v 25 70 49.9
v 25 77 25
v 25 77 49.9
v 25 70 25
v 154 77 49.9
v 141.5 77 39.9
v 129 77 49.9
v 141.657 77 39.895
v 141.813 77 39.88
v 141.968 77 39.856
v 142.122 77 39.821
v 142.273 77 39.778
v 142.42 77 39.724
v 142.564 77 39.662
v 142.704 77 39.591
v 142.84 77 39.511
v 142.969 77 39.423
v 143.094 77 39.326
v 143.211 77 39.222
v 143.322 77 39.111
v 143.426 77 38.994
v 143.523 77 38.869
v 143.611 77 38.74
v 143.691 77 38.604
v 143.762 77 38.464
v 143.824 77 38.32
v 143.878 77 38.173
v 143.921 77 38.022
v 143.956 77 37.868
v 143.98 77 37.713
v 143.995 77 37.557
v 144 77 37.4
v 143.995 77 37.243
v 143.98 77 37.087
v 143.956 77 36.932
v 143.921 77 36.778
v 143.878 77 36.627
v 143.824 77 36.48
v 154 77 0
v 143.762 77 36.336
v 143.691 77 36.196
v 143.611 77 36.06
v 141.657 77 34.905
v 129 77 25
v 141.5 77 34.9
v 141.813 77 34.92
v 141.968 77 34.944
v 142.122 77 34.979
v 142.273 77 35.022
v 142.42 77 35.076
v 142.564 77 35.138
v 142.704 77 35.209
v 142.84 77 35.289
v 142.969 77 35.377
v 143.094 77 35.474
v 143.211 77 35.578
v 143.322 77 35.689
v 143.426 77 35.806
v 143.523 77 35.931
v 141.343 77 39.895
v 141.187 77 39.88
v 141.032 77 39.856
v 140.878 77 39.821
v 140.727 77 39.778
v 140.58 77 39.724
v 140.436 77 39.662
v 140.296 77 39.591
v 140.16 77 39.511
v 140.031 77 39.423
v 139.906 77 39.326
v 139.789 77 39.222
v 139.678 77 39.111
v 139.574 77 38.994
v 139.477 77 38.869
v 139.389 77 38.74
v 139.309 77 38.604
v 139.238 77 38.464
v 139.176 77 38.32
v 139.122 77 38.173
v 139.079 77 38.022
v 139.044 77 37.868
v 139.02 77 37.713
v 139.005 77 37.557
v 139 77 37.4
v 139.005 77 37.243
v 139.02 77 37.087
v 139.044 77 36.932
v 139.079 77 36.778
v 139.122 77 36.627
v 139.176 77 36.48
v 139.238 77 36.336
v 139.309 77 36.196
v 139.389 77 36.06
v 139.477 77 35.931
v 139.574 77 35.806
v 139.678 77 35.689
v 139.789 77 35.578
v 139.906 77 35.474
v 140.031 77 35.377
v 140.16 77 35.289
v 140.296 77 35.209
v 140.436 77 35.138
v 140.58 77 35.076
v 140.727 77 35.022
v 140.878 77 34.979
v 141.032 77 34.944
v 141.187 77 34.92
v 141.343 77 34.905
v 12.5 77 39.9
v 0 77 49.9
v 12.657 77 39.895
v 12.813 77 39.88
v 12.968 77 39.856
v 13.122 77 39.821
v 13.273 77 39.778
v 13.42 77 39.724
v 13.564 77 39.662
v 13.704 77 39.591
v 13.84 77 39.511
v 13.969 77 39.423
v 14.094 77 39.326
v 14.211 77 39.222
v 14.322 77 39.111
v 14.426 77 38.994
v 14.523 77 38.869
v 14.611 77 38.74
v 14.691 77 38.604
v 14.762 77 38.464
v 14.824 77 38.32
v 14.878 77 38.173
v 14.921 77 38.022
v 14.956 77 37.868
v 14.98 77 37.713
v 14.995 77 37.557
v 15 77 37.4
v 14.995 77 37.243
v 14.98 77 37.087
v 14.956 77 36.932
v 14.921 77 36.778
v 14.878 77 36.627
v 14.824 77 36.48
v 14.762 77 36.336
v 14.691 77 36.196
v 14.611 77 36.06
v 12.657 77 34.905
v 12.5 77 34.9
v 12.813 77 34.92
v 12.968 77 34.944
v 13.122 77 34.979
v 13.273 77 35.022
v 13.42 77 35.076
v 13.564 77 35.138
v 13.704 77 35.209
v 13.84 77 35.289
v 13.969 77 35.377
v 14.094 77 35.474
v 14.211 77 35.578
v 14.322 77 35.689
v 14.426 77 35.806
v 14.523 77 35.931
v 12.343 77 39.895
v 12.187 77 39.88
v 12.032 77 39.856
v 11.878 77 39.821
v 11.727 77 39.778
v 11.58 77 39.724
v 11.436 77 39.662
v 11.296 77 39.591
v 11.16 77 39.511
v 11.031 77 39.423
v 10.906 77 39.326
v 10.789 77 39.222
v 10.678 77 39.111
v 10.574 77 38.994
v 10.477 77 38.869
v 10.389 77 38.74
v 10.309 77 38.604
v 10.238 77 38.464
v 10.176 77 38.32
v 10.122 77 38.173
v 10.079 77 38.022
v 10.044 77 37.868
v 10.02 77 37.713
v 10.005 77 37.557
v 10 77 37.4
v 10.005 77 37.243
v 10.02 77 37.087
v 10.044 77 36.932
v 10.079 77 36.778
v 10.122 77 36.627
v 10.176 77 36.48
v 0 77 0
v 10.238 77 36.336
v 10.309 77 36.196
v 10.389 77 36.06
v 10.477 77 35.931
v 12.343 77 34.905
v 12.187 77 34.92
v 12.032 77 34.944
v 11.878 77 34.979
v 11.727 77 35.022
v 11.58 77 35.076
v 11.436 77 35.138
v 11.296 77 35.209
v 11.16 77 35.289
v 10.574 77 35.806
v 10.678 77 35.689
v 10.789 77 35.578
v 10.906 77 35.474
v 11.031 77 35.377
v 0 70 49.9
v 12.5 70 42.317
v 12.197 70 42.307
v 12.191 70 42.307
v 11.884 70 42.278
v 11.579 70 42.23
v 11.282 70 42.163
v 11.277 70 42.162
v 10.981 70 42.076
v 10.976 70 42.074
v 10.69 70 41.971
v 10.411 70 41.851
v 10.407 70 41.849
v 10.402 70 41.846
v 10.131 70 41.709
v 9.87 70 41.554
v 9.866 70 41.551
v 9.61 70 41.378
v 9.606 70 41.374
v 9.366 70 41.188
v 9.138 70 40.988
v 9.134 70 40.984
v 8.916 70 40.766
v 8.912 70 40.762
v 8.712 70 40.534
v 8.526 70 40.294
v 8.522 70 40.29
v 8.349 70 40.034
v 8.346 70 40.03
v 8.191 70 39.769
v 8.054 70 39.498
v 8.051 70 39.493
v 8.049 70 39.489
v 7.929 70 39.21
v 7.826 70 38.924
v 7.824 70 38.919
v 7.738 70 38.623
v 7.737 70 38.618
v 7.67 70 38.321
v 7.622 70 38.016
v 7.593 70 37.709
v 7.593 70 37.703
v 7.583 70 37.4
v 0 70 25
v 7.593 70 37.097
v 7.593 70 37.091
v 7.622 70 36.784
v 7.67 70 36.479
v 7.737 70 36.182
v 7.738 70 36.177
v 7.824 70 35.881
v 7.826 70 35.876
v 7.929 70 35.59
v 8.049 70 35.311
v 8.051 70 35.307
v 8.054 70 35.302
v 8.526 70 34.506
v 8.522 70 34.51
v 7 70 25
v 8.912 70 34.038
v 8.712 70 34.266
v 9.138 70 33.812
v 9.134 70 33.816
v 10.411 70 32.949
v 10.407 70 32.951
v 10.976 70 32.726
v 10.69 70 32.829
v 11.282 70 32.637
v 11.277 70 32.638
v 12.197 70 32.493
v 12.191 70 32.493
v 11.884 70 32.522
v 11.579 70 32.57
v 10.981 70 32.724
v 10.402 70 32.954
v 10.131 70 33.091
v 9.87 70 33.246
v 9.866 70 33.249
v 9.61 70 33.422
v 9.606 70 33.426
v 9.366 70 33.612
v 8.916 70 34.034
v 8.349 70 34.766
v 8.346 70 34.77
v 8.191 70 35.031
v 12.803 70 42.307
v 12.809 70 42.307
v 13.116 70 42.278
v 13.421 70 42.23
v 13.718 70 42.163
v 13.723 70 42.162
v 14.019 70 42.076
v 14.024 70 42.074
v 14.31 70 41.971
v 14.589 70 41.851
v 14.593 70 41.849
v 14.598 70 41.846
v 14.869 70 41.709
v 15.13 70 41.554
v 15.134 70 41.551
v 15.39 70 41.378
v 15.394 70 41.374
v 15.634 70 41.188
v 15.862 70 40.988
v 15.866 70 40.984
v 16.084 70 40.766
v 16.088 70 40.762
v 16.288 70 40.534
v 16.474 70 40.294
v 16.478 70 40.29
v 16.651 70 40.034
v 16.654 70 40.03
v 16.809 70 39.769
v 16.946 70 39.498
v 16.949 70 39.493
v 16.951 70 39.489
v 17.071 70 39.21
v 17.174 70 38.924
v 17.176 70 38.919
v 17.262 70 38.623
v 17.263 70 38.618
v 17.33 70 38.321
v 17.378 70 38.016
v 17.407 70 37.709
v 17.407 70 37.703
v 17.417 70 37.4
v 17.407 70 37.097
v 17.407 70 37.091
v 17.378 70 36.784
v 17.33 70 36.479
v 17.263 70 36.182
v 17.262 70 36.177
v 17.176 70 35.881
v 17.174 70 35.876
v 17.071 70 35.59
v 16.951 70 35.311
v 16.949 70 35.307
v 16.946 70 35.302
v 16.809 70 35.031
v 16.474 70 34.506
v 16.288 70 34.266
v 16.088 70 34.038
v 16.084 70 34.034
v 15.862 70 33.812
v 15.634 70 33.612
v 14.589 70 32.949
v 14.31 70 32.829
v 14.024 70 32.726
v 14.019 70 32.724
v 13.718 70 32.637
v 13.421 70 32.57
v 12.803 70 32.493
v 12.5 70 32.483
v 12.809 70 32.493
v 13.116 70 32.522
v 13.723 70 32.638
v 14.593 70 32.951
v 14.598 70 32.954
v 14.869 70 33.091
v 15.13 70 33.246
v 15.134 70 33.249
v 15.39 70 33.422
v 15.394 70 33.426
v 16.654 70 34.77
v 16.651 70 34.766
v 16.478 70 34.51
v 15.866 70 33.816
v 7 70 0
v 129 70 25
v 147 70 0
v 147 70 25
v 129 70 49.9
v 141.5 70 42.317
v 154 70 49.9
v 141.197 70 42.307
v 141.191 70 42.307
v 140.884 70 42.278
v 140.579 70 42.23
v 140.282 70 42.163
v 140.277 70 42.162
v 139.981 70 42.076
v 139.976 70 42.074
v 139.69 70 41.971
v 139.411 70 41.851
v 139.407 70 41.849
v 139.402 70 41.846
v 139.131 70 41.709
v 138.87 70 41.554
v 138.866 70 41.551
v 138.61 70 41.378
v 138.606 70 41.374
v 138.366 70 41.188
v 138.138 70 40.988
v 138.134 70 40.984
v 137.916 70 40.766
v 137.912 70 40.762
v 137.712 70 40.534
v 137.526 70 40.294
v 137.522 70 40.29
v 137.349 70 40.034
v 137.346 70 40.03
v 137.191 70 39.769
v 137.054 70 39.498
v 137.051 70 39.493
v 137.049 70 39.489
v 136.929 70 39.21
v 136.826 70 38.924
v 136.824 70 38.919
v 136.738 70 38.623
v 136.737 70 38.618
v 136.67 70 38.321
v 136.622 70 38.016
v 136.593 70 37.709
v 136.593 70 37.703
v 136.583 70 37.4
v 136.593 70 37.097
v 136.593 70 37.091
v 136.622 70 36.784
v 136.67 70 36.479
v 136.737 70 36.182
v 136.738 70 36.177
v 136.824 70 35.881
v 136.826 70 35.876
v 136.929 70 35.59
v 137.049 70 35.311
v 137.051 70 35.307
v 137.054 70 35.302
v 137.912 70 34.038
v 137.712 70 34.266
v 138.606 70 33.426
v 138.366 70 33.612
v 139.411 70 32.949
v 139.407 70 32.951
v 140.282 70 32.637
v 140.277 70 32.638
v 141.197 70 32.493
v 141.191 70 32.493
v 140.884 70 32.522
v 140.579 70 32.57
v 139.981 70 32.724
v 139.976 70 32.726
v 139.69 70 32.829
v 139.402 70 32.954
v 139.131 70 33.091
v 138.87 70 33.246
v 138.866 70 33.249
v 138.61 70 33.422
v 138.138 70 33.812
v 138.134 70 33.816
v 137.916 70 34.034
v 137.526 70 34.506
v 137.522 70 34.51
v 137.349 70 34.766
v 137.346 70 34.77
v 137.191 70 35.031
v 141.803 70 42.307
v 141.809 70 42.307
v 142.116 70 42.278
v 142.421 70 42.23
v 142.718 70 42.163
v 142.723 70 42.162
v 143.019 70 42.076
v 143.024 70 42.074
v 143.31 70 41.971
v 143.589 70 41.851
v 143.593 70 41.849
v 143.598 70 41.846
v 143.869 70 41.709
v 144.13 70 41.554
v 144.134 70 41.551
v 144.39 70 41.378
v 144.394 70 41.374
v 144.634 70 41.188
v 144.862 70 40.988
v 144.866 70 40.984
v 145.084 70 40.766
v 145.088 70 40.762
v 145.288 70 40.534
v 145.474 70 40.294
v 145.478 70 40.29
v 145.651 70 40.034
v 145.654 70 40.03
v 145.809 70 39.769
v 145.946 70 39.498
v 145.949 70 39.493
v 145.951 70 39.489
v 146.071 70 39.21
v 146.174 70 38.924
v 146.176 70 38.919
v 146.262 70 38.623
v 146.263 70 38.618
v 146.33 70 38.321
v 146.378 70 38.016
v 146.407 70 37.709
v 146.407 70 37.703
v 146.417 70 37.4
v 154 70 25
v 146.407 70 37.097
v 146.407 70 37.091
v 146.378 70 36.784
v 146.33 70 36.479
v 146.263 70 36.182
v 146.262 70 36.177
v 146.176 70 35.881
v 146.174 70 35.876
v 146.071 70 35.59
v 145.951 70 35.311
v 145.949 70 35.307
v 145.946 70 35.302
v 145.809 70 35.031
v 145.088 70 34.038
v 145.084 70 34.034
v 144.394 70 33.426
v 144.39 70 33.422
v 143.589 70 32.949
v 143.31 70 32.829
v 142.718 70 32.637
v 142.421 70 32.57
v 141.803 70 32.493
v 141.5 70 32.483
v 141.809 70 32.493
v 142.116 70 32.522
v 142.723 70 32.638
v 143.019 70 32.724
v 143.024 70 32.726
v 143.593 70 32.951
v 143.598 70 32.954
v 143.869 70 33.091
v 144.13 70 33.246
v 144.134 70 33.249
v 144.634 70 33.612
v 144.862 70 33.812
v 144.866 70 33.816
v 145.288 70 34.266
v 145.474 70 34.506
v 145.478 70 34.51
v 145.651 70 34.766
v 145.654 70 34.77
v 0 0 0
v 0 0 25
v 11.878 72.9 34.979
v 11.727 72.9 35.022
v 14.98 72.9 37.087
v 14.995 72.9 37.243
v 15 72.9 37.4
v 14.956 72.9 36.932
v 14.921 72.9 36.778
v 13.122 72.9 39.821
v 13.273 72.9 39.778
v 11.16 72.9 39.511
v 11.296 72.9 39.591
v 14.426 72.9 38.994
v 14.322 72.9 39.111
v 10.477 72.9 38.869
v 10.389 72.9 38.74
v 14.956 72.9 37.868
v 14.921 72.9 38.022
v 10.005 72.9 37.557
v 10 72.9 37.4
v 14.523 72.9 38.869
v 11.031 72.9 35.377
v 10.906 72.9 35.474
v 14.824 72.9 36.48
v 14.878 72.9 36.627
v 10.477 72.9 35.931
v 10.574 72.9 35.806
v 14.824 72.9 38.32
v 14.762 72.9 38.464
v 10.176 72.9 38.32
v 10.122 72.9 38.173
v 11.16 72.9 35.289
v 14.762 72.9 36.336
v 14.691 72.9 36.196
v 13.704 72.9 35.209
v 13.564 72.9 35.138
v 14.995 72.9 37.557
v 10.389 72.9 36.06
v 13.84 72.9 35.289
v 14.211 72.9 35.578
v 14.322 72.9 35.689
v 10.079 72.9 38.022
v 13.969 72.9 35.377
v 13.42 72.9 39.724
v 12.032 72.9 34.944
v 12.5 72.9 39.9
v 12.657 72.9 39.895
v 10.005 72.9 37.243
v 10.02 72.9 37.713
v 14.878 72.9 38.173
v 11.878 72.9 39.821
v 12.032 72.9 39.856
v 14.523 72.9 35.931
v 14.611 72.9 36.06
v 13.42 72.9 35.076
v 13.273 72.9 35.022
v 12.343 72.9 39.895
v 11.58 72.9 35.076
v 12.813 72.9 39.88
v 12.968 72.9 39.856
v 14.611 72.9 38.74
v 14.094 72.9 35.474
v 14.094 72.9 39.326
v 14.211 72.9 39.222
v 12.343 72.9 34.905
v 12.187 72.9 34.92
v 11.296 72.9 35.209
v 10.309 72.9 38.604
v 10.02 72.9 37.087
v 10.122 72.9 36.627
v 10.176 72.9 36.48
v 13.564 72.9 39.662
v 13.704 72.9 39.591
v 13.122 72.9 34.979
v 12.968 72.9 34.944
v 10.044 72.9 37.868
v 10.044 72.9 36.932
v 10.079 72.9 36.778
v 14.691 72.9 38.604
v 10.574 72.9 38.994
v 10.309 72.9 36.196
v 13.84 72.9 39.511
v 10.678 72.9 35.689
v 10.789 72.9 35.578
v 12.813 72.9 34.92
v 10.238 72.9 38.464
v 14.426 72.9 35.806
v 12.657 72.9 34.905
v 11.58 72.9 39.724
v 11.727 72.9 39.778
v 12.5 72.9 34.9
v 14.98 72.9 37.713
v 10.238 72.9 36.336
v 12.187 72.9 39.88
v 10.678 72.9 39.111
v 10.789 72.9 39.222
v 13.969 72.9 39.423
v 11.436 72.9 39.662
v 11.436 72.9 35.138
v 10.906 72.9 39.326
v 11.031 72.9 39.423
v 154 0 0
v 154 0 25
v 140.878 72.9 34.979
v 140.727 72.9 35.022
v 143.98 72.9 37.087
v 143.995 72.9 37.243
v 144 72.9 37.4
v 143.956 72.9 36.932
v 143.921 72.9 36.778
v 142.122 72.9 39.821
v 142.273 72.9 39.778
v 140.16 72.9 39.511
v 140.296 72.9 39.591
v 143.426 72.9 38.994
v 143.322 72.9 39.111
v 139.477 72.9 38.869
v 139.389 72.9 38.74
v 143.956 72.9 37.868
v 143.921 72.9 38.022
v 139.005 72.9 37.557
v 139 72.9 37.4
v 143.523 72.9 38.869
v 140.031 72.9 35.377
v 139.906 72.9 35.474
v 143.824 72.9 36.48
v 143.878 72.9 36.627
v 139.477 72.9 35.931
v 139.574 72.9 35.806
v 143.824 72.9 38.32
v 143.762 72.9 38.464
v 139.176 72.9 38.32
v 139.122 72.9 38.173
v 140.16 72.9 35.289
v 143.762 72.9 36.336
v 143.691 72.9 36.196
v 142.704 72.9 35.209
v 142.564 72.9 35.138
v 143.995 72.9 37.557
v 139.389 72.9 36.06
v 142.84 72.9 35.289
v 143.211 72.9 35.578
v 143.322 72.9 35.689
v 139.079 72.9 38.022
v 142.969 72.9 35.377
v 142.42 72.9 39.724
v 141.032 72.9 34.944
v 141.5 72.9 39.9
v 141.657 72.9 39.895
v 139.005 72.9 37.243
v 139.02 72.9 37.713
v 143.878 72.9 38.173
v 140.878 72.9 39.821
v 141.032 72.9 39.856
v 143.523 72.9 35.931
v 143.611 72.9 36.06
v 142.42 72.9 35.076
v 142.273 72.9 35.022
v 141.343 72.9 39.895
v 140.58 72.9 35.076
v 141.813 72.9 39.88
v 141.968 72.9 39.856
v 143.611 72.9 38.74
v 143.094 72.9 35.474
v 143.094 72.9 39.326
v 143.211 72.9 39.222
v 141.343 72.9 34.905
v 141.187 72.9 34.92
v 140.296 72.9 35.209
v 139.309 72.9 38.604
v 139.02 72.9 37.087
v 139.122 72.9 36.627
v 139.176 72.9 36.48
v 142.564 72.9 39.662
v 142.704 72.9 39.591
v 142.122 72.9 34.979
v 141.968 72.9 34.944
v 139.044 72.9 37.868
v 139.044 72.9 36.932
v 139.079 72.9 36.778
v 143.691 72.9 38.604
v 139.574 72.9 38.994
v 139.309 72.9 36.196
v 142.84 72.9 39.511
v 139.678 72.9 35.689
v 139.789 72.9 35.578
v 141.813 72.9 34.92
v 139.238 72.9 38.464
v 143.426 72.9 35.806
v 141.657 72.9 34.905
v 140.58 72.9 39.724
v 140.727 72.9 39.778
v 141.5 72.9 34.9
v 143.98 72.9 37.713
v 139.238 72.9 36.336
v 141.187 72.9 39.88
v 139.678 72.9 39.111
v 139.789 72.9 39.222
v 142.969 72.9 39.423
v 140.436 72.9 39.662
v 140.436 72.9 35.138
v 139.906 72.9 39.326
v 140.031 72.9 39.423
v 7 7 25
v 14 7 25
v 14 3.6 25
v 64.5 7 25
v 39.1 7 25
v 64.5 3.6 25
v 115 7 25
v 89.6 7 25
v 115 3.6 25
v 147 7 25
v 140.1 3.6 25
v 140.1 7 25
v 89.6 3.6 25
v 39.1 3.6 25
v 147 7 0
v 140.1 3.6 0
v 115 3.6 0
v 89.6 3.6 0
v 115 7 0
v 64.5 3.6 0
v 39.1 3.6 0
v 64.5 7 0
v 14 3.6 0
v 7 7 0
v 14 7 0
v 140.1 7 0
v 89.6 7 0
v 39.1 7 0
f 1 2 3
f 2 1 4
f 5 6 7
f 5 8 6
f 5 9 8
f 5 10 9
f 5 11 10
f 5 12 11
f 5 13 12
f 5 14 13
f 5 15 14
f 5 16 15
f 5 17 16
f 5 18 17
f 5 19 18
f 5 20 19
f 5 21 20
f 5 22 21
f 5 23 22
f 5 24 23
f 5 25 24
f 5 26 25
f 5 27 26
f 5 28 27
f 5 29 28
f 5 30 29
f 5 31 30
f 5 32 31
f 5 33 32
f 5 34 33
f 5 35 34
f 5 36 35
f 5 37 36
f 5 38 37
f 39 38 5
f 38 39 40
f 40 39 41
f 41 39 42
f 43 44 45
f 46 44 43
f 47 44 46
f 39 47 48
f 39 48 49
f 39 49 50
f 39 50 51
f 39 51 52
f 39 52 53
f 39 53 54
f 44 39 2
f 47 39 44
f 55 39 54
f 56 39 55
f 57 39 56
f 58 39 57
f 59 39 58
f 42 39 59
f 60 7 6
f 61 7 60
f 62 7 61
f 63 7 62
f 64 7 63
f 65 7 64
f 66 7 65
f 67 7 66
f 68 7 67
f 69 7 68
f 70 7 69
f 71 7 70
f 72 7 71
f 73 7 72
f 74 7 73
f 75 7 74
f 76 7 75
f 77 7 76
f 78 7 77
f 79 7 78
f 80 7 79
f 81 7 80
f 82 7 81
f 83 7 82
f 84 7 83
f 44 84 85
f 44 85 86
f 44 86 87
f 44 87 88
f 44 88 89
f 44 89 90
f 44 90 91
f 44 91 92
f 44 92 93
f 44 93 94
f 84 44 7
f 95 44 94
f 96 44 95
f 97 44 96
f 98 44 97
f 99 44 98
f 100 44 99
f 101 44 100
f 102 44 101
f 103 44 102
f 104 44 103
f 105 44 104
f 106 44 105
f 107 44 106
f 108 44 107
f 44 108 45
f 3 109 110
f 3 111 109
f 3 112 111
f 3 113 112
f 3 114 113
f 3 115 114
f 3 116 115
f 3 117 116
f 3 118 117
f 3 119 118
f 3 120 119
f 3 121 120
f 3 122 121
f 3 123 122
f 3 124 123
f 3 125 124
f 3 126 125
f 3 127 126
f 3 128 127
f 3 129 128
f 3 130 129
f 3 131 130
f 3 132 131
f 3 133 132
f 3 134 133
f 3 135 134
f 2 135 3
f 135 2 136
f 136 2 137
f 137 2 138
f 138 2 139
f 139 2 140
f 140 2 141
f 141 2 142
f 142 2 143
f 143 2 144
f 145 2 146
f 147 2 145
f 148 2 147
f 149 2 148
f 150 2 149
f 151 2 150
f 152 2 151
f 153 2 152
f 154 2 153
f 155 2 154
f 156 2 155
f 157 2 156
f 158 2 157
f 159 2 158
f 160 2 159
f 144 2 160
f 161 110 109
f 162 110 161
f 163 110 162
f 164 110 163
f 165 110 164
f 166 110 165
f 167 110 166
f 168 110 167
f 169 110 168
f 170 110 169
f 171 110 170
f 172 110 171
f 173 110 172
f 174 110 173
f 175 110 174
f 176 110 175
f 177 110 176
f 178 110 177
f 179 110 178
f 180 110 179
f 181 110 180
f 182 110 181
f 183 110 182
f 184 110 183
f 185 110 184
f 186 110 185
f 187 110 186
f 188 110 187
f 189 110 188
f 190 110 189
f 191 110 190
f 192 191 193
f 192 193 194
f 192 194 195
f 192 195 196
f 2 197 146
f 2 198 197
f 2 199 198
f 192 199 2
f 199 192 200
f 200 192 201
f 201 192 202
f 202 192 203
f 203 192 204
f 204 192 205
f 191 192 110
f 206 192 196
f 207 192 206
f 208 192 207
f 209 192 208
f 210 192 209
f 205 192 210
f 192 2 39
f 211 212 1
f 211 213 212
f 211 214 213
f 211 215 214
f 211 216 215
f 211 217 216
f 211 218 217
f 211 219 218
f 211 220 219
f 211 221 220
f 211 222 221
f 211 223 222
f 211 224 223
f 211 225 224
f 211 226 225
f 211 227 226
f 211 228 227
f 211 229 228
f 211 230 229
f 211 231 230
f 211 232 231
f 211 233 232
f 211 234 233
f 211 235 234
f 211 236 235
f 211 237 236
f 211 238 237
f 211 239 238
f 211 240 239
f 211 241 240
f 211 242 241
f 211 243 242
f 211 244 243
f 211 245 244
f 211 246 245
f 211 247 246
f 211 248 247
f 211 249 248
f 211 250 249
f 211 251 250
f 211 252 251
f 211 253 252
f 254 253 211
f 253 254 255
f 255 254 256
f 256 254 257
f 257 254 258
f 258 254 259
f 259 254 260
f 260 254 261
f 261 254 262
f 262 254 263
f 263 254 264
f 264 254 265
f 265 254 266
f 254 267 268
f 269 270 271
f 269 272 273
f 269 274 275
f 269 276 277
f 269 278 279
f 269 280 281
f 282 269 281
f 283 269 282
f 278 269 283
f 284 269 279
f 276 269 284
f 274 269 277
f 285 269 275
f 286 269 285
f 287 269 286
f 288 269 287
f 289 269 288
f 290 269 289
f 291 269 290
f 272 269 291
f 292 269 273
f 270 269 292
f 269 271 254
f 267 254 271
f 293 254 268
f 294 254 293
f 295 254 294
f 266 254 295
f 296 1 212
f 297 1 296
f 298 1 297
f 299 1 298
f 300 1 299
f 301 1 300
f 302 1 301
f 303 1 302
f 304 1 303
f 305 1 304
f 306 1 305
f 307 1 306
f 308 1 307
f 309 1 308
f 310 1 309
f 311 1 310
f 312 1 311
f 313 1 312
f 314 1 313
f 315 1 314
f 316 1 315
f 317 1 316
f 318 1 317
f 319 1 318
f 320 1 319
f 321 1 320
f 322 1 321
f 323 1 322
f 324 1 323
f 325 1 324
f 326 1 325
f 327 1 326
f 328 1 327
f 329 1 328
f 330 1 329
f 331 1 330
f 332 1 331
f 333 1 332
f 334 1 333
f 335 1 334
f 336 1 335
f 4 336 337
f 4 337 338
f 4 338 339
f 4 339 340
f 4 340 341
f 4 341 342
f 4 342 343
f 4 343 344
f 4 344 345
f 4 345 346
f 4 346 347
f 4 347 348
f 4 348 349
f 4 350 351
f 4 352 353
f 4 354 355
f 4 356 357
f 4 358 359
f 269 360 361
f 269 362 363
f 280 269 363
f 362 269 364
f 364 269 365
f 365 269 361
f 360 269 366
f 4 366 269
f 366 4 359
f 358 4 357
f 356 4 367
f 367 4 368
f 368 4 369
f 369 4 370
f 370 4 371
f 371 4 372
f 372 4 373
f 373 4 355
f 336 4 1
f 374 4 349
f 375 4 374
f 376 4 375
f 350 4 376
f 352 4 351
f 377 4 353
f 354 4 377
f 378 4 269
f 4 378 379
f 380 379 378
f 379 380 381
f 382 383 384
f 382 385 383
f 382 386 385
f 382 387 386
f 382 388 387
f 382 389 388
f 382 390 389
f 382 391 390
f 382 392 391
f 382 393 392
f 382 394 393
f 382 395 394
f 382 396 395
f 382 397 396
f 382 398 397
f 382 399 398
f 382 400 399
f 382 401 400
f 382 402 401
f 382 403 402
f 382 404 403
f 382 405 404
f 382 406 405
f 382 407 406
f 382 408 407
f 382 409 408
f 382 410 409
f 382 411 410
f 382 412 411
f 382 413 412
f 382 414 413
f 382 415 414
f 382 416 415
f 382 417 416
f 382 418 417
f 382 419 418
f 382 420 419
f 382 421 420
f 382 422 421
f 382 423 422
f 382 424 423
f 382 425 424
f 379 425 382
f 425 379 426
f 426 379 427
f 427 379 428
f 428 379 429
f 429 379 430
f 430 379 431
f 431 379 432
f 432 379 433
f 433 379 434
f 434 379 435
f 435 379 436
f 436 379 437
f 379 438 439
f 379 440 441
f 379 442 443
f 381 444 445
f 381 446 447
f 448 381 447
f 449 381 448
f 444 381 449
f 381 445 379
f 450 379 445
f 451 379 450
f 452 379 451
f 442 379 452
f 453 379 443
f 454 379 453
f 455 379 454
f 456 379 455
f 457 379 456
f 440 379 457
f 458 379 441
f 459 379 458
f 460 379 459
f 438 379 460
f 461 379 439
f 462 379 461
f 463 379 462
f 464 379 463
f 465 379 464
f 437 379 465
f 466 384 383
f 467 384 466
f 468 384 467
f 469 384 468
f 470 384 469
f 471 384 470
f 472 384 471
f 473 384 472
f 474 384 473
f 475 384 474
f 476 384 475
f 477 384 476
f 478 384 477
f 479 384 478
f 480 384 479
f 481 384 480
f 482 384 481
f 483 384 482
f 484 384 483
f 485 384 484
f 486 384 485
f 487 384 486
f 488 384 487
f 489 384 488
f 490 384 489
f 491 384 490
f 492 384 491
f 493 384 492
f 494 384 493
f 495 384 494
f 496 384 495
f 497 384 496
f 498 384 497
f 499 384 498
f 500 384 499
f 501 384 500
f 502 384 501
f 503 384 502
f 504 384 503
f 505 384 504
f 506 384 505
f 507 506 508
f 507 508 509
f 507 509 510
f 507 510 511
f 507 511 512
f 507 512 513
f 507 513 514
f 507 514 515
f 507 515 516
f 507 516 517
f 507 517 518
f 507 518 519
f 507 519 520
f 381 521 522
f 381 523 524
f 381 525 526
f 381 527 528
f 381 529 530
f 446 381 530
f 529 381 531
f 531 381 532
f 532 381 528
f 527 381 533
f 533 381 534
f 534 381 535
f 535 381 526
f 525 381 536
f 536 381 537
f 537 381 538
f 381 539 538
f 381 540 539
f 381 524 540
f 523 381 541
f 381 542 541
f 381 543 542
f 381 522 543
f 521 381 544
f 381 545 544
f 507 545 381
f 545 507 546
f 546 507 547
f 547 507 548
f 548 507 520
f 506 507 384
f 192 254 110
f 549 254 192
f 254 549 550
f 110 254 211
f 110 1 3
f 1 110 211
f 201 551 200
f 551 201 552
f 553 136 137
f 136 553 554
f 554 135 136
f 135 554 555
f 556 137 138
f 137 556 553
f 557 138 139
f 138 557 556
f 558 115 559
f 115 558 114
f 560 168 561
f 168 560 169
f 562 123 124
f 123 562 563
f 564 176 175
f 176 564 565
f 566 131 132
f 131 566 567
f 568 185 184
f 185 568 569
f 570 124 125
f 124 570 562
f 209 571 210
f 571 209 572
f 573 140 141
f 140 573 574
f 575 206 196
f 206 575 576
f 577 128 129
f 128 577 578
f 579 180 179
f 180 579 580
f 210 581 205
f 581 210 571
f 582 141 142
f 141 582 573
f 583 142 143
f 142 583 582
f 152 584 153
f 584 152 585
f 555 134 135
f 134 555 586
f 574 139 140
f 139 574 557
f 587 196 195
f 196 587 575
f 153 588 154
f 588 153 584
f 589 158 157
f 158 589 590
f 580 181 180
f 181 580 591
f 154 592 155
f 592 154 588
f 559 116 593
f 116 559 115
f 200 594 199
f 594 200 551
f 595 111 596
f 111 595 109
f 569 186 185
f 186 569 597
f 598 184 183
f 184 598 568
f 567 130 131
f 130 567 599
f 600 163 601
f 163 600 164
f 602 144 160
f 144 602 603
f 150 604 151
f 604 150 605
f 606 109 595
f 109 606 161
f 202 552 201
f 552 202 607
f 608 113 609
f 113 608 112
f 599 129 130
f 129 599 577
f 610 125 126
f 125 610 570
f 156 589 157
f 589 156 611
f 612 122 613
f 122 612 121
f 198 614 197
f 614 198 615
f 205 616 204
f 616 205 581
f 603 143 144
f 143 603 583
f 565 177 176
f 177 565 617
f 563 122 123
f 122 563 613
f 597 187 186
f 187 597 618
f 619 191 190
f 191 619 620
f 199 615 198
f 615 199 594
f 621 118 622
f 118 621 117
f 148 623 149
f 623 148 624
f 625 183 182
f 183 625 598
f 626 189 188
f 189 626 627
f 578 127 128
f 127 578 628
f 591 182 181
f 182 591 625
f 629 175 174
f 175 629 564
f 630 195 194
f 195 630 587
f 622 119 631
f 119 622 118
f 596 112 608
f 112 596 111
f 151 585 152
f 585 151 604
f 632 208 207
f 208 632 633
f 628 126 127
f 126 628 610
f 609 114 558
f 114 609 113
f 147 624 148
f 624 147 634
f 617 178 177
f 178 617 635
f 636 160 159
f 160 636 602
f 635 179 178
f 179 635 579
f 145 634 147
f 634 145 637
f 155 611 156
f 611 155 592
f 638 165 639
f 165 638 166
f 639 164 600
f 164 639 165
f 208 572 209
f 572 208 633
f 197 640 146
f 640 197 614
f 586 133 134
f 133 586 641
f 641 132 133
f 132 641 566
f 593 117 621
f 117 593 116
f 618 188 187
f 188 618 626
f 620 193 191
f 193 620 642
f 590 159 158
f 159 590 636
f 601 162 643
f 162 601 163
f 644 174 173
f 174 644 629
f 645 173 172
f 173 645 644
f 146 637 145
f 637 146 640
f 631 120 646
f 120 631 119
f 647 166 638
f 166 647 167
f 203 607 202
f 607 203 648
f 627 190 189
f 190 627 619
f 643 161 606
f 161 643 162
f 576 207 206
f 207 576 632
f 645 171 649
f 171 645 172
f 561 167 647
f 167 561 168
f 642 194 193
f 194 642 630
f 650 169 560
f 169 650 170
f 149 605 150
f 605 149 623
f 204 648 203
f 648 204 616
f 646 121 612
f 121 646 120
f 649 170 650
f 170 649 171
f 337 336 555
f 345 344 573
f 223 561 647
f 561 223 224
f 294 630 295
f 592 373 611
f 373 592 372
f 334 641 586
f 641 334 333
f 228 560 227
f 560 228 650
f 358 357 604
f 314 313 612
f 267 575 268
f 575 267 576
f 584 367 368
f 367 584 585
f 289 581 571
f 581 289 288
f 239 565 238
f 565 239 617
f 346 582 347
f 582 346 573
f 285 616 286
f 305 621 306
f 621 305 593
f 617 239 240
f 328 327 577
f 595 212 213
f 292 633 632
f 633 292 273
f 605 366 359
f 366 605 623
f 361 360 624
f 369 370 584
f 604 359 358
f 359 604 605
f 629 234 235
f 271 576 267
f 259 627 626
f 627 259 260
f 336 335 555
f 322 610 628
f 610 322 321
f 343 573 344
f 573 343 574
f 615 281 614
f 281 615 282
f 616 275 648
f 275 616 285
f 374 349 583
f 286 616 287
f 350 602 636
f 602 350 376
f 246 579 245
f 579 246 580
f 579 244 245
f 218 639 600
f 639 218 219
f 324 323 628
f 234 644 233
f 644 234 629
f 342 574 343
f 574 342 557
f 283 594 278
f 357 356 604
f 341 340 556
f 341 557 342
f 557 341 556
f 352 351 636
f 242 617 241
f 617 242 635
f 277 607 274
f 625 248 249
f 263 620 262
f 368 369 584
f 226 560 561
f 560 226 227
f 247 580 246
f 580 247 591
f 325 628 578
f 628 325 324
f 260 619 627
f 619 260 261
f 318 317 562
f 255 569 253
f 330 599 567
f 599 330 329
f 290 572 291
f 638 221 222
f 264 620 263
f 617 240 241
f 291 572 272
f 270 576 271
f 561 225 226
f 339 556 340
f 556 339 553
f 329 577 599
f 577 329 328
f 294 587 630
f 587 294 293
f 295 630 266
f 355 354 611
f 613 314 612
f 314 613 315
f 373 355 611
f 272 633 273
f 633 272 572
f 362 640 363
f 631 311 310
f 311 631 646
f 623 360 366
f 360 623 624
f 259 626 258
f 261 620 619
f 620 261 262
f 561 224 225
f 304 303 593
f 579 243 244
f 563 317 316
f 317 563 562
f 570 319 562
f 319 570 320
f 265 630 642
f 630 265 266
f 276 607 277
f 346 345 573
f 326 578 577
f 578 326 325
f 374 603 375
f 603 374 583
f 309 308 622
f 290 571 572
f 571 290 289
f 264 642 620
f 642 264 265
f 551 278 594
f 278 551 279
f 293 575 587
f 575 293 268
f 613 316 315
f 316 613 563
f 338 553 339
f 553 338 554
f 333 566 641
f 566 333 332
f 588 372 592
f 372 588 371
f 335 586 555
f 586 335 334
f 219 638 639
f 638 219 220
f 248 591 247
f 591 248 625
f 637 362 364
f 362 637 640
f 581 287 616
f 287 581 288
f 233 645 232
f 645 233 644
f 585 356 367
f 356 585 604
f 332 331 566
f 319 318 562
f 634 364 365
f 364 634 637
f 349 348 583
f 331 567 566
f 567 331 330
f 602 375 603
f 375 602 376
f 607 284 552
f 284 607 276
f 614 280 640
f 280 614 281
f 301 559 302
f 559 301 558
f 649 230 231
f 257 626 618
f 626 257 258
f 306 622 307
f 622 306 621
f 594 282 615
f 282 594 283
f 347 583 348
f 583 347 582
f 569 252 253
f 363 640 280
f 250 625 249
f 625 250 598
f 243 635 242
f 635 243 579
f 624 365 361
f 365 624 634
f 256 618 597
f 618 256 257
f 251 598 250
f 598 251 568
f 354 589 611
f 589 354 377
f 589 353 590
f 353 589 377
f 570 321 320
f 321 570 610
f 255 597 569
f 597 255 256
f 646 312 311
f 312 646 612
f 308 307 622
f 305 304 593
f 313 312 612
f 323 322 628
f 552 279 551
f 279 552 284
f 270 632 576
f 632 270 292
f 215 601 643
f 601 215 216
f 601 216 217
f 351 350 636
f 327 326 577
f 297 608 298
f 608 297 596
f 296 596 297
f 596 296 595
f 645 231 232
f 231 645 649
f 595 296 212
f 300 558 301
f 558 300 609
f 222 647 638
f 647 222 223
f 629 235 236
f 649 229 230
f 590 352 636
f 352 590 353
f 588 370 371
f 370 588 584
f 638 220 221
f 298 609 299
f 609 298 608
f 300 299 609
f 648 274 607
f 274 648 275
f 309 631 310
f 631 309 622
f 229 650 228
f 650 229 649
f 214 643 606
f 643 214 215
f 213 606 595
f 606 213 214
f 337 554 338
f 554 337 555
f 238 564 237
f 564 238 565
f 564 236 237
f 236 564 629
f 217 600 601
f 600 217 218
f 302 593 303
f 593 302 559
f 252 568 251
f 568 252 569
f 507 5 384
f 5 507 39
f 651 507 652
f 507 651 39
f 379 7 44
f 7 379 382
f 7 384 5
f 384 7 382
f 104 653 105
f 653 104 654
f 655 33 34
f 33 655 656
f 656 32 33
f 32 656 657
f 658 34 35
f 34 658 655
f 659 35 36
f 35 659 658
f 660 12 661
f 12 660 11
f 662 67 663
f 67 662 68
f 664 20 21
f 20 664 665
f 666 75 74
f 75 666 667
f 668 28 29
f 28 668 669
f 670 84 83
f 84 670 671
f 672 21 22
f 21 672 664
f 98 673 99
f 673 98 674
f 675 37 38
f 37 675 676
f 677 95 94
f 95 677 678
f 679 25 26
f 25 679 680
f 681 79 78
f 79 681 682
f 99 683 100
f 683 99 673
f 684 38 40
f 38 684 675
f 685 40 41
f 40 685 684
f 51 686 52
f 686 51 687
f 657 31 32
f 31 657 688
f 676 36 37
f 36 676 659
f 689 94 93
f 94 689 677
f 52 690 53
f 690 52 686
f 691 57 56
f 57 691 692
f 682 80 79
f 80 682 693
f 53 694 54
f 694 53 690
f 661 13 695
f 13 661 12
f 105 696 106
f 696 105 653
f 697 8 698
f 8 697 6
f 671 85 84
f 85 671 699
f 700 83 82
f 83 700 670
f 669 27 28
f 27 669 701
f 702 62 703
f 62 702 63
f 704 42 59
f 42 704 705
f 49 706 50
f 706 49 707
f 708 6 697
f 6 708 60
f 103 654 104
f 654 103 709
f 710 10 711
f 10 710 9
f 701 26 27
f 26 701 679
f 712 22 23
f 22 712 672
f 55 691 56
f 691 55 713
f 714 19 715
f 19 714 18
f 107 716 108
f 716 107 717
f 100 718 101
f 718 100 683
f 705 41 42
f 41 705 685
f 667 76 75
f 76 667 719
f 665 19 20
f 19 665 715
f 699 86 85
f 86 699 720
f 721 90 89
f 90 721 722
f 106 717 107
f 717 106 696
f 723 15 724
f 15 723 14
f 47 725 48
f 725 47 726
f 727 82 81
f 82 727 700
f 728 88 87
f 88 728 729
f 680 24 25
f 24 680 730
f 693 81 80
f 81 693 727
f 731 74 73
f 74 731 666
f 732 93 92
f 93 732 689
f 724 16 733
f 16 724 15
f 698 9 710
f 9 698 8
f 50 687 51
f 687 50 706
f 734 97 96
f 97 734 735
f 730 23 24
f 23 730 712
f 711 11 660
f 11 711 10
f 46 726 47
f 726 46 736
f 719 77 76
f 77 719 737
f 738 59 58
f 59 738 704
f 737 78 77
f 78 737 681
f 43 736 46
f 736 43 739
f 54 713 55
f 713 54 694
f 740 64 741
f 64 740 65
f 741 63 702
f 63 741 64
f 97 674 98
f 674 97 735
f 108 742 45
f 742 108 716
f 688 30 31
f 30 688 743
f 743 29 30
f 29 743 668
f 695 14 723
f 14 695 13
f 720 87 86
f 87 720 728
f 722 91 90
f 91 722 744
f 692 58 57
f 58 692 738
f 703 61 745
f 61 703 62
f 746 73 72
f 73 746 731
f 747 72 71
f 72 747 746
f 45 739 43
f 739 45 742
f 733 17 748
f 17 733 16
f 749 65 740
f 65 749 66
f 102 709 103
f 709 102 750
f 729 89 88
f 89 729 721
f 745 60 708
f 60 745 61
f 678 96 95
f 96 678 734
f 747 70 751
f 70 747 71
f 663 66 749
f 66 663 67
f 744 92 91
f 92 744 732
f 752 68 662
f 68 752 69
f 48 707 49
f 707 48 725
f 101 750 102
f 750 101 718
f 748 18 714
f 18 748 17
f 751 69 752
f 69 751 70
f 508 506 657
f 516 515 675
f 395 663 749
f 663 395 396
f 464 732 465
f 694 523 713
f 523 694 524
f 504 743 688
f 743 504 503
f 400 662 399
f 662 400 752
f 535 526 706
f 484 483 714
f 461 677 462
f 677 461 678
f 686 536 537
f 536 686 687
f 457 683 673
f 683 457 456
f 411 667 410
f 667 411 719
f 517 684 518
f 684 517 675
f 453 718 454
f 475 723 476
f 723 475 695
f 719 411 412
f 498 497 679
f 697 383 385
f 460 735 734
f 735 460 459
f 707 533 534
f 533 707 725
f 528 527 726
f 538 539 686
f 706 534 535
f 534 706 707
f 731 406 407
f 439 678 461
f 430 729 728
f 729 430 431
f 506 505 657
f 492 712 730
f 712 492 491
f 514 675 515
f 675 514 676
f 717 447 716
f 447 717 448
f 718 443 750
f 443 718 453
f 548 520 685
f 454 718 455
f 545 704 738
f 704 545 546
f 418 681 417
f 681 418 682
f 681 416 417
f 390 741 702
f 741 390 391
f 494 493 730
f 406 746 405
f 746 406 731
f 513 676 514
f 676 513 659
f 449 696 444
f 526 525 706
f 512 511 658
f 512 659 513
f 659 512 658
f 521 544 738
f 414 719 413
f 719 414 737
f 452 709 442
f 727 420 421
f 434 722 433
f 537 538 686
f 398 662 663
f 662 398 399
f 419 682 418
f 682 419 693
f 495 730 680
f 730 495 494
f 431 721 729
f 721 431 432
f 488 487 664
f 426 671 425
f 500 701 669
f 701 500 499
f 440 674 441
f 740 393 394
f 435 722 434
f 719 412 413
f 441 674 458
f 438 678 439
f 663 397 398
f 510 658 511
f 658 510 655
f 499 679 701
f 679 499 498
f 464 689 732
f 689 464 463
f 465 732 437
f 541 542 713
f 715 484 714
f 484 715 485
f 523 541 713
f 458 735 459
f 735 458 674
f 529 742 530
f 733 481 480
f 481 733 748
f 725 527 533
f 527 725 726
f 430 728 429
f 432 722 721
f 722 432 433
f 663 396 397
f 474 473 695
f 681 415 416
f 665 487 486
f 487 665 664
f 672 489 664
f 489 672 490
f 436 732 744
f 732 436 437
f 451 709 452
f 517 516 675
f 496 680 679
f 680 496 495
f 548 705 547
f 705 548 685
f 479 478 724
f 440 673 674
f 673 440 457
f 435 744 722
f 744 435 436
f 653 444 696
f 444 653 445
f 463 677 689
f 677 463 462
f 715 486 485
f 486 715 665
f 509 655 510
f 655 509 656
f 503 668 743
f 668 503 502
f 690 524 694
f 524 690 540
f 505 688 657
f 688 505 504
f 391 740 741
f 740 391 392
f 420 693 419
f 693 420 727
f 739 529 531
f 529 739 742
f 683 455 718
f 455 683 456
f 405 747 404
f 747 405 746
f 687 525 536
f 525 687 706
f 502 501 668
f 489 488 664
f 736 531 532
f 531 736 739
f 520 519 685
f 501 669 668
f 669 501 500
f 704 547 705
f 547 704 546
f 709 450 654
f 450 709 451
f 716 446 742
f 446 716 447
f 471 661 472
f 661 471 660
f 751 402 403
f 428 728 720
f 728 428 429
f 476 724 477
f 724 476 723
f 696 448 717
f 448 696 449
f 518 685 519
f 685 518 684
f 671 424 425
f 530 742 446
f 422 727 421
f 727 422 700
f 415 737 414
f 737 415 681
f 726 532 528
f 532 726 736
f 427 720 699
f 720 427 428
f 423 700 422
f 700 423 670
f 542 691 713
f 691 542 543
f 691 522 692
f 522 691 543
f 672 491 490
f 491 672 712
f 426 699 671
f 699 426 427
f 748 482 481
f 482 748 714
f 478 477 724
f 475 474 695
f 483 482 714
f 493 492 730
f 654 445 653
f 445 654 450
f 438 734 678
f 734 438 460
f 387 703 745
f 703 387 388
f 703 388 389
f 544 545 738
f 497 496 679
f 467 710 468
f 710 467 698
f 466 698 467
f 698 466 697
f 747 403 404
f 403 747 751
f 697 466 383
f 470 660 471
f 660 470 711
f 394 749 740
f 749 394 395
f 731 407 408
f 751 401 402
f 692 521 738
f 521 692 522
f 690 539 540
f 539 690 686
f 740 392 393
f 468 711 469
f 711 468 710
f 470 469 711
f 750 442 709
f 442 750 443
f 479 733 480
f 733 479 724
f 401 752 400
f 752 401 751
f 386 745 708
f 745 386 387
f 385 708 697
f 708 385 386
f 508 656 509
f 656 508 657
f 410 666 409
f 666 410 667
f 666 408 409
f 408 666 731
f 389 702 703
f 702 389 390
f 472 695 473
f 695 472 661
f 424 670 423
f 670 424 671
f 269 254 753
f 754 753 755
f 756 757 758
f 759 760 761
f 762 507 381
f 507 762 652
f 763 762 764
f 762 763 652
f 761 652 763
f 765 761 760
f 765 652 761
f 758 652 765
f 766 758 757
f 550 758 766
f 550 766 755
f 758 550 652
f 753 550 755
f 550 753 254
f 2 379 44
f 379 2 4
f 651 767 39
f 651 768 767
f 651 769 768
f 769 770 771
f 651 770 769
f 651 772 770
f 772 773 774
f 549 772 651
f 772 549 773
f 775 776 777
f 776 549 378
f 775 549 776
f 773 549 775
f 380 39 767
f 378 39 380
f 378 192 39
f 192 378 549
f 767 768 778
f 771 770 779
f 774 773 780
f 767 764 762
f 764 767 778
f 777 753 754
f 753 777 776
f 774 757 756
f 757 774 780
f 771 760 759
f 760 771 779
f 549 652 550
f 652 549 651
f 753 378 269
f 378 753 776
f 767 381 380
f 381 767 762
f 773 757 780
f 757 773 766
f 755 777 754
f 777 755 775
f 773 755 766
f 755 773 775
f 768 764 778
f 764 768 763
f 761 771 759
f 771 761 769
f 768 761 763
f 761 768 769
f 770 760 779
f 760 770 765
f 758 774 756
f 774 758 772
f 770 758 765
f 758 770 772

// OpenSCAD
// file: bitholder_lib.scad
// simple shelf to hold the bit screwdrivers
// the selves will be attached to a larger IKEA shelf systemwith screws from below
// the surroundig boxes for the two sets are:
// (depth, depth stop, height, width)
// 220, 190, 100, 200 (mm)
// 220, 170, 70, 140 (mm)

material_width = 7; // mm
shelf_depth = 220;
shelf1_depth_stop = 190;


shelf2_depth_stop = 170;


rail_depth = 25;
ear_length = 25;

epsilon = 0.1;

module ear() {
    difference() {
        translate([0, 0, material_width / 2])
            cube([ear_length, ear_length, material_width], center = true);
        translate([0, 0, - epsilon])
            cylinder(d = 5, h = material_width + 2 * epsilon, $fn = 100);
        translate([0, 0, - epsilon])
            cylinder(d1 = 10, d2 = 5, h = 3, $fn = 100);
    }
}
rail(100, 140);
module rail(width, height) {
    difference() {
        union() {
            // the bottom rail
            cube([width + 2 * material_width, material_width, rail_depth]);

            // the sides of the rail
            cube([material_width, height + material_width, rail_depth]);
            translate([width + material_width, 0, 0])
                cube([material_width, height + material_width, rail_depth]);

            // the top rail
            translate([0, height, 0])
                cube([width + 2 * material_width, material_width, rail_depth]);

            // the ears to hold the rail in place with screws
            translate([ear_length / 2, height, ear_length / 2 + rail_depth - epsilon])
                rotate([- 90, 0, 0])
                    ear();
            translate([width + 2* material_width - ear_length / 2, height, ear_length / 2 + rail_depth - epsilon])
                rotate([- 90, 0,])
                    ear();
        }
        translate([material_width * 2, material_width / 2 + epsilon, - epsilon])
            cube([rail_depth + epsilon, material_width / 2 + epsilon, rail_depth + 2 * epsilon]);
        translate([width - rail_depth, material_width / 2 + epsilon, - epsilon])
            cube([rail_depth + epsilon, material_width / 2 + epsilon, rail_depth + 2 * epsilon]);
        translate([width / 2 - rail_depth / 2 + material_width, material_width / 2 + epsilon, - epsilon])
            cube([rail_depth + epsilon, material_width / 2 + epsilon, rail_depth + 2 * epsilon]);
    }
}

module bottom() {
    difference() {
        cube([shelf_depth, rail_depth, material_width]);
        translate([- epsilon, - epsilon, - epsilon])
            cube([rail_depth + epsilon, rail_depth + 2 * epsilon, material_width / 2 + epsilon]);
        translate([shelf_depth - rail_depth + epsilon, - epsilon, - epsilon])
            cube([rail_depth + epsilon, rail_depth + 2 * epsilon, material_width / 2 + epsilon]);
    }
}
// main file
use <bitholder_lib.scad>;

shelf_height = 70;
shelf_width = 140;

rail(shelf_width, shelf_height);
